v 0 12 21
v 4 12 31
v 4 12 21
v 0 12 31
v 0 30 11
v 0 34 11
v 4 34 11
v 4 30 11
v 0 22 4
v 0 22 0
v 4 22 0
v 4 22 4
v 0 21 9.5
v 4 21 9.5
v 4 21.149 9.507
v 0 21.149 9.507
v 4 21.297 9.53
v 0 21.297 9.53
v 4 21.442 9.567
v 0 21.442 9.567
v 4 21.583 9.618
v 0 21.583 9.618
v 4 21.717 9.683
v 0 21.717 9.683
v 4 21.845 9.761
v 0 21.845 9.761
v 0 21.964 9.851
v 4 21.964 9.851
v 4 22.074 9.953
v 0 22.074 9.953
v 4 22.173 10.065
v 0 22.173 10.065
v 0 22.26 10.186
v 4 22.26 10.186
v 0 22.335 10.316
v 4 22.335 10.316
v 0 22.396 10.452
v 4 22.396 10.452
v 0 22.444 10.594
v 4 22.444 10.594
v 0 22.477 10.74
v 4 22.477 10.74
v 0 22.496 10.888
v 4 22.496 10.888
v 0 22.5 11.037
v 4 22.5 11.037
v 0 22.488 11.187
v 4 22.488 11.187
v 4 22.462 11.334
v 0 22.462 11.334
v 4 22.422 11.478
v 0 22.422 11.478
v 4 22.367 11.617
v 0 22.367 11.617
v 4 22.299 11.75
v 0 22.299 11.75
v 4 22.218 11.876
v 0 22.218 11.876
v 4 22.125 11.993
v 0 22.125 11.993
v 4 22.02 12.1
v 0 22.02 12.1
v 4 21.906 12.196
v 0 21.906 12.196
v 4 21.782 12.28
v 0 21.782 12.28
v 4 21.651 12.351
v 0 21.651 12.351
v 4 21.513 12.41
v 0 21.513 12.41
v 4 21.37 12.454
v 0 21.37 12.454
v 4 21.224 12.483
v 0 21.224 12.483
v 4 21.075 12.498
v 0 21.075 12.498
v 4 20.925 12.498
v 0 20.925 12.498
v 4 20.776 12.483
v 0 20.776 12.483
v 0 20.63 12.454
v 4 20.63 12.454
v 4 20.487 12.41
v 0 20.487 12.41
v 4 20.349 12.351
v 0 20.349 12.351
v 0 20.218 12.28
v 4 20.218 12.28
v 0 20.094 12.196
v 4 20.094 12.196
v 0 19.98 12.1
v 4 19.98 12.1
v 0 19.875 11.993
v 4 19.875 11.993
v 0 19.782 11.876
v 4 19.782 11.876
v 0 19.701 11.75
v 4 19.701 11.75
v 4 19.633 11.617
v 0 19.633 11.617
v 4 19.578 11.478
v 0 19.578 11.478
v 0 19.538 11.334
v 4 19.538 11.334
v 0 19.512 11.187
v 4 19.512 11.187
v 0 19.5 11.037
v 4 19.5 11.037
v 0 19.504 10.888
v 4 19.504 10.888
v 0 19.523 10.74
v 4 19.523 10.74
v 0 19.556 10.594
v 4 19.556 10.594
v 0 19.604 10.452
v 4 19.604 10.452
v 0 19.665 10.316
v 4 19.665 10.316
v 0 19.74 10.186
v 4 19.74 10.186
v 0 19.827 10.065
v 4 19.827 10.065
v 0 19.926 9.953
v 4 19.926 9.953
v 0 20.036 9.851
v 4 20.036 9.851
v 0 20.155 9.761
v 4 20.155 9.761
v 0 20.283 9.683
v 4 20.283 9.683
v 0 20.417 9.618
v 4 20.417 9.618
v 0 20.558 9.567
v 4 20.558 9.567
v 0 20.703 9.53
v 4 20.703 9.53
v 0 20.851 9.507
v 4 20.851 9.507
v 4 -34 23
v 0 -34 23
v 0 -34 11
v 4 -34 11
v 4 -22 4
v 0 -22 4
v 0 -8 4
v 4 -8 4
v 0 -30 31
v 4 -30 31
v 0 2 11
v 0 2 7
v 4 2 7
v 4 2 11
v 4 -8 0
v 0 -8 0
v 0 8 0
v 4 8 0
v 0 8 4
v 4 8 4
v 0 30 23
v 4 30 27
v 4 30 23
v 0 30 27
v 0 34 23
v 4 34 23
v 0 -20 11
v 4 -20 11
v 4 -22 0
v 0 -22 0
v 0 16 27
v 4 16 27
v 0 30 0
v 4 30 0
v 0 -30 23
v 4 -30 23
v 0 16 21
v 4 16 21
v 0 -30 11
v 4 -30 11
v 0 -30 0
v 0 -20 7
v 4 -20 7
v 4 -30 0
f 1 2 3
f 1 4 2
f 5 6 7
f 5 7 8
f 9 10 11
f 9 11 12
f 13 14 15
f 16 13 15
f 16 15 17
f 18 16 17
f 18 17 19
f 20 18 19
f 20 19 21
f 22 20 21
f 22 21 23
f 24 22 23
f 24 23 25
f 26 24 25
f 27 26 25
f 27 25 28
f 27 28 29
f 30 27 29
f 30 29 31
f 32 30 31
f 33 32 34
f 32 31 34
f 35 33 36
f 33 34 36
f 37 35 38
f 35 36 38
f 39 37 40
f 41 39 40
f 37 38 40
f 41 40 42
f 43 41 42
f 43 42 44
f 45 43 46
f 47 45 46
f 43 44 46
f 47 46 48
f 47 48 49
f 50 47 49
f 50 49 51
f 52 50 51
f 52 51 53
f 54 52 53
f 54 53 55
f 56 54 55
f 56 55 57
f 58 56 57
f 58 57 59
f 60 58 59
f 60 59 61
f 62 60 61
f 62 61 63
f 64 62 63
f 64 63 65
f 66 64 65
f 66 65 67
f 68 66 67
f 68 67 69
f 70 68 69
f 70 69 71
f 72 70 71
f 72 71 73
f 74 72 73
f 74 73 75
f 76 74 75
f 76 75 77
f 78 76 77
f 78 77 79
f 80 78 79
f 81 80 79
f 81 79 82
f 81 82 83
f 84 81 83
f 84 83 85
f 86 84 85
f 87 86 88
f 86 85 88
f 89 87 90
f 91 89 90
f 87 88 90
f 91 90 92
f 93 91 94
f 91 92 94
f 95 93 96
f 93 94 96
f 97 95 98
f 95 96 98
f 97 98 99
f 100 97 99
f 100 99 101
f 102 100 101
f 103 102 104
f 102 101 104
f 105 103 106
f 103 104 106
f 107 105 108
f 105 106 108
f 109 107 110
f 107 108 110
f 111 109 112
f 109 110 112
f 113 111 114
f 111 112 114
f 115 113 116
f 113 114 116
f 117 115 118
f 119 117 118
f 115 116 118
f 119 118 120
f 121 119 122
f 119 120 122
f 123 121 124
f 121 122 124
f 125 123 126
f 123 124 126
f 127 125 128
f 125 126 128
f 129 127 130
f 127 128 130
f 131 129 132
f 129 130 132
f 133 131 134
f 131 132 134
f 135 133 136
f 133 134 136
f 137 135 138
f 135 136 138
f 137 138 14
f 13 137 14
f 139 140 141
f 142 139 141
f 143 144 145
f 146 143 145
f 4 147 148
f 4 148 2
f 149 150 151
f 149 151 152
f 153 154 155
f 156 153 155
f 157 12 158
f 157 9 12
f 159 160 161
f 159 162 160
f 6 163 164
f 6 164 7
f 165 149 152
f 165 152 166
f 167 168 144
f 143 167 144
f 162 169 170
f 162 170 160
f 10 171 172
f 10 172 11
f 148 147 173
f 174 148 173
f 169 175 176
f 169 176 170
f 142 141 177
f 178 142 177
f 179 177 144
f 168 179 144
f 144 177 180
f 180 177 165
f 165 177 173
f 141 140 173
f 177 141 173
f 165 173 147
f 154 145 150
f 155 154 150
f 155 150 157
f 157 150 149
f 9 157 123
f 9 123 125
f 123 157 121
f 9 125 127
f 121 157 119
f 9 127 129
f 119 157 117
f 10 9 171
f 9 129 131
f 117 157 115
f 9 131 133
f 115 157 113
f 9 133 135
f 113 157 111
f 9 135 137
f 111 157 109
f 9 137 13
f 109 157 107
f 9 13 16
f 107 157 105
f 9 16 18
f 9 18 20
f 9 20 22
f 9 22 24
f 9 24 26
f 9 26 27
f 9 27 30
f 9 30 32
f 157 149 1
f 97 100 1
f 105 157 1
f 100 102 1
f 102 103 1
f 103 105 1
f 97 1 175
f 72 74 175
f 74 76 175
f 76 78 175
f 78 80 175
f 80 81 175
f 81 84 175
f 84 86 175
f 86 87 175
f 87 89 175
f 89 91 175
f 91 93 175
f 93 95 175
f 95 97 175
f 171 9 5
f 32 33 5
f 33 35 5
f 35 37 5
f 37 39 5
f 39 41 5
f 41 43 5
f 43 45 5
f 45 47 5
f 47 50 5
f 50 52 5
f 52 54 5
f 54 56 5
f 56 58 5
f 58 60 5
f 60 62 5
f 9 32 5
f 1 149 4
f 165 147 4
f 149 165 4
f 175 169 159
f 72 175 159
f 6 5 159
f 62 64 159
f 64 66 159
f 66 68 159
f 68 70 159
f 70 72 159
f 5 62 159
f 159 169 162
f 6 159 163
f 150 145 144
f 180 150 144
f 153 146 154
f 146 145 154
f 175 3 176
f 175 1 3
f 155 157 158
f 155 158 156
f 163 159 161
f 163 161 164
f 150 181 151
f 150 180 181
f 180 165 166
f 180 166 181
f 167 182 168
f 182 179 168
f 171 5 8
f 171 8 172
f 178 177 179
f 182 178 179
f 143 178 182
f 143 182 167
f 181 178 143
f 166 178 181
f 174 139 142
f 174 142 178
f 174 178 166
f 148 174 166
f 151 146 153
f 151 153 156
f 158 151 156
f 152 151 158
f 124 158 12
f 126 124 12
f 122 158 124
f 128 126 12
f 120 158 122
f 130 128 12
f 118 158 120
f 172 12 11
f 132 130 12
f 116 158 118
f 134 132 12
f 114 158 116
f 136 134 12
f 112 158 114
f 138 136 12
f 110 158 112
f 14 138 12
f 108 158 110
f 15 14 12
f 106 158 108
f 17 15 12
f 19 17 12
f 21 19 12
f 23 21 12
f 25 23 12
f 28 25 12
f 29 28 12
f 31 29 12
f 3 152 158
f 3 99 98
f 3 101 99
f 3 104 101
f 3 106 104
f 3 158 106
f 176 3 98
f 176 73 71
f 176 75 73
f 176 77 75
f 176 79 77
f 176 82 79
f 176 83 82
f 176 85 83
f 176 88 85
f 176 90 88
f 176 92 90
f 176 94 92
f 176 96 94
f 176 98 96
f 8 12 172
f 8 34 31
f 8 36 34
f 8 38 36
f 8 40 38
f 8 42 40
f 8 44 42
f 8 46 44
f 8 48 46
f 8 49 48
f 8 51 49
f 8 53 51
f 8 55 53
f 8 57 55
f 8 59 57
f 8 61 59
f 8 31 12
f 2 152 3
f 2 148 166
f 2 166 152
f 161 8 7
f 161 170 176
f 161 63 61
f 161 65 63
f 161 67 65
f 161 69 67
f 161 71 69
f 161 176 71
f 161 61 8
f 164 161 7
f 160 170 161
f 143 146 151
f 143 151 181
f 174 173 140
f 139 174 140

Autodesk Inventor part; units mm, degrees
ref_plane "YZ Plane" through (0, 0, 0) normal (1, 0, 0) x (0, 1, 0)
ref_plane "XZ Plane" through (0, 0, 0) normal (0, 1, 0) x (-1, 0, 0)
ref_plane "XY Plane" through (0, 0, 0) normal (0, 0, 1) x (1, 0, 0)
sketch "Эскиз2" plane through (0, 0, 0) normal (1, 0, 0) x (0, 1, 0)
  line L0 (-30, 31) -> (-30, 23)
  line L1 (-30, 23) -> (-34, 23)
  line L2 (-34, 23) -> (-34, 11)
  line L3 (-34, 11) -> (-30, 11)
  line L4 (-30, 11) -> (-30, 0)
  line L5 (-30, 0) -> (-22, 0)
  line L6 (-22, 0) -> (-22, 4)
  line L7 (-22, 4) -> (-8, 4)
  line L8 (-8, 4) -> (-8, 0)
  line L9 (-8, 0) -> (0, 0)
  line L10 (0, 0) -> (0, 31) construction
  line L11 (30, 23) -> (34, 23)
  line L12 (34, 23) -> (34, 11)
  line L13 (34, 11) -> (30, 11)
  line L14 (30, 11) -> (30, 0)
  line L15 (30, 0) -> (22, 0)
  line L16 (22, 0) -> (22, 4)
  line L17 (22, 4) -> (8, 4)
  line L18 (8, 4) -> (8, 0)
  line L19 (8, 0) -> (0, 0)
  line L20 (-20, 7) -> (2, 7)
  line L21 (2, 7) -> (2, 11)
  line L22 (2, 11) -> (-20, 11)
  line L23 (-20, 11) -> (-20, 7)
  line L24 (-30, 31) -> (12, 31)
  line L25 (12, 31) -> (12, 21)
  line L26 (12, 21) -> (16, 21)
  line L27 (16, 21) -> (16, 27)
  line L28 (16, 27) -> (30, 27)
  line L29 (30, 27) -> (30, 23)
  point P0 (0, 0)
  dimension "d0" = 4
  dimension "d1" = 12
  dimension "d2" = 8
  dimension "d4" = 11
  dimension "d5" = 60
  dimension "d6" = 14
  dimension "d7" = 16
  dimension "d8" = 10
  dimension "d9" = 22
  dimension "d10" = 7
  dimension "d13" = 42
  dimension "d15" = 10
  dimension "d16" = 4
extrude "Выдавливание1" add sketch "Эскиз2" along normal blind 4
sketch "Эскиз3" plane through (4, 0, 0) normal (1, 0, 0) x (0, 0, -1)
  circle A0 centre (-11, 21) radius 1.5
  line L0 (-27, 30) -> (-27, 16) projected
  line L1 (0, 30) -> (-11, 30) projected
  point P0 (0, 0)
  dimension "d17" = 16
  dimension "d18" = 9
  dimension "d19" = 3
extrude "Выдавливание2" cut sketch "Эскиз3" against normal through all
properties part number "batBack" material "Дерево (береза)"
